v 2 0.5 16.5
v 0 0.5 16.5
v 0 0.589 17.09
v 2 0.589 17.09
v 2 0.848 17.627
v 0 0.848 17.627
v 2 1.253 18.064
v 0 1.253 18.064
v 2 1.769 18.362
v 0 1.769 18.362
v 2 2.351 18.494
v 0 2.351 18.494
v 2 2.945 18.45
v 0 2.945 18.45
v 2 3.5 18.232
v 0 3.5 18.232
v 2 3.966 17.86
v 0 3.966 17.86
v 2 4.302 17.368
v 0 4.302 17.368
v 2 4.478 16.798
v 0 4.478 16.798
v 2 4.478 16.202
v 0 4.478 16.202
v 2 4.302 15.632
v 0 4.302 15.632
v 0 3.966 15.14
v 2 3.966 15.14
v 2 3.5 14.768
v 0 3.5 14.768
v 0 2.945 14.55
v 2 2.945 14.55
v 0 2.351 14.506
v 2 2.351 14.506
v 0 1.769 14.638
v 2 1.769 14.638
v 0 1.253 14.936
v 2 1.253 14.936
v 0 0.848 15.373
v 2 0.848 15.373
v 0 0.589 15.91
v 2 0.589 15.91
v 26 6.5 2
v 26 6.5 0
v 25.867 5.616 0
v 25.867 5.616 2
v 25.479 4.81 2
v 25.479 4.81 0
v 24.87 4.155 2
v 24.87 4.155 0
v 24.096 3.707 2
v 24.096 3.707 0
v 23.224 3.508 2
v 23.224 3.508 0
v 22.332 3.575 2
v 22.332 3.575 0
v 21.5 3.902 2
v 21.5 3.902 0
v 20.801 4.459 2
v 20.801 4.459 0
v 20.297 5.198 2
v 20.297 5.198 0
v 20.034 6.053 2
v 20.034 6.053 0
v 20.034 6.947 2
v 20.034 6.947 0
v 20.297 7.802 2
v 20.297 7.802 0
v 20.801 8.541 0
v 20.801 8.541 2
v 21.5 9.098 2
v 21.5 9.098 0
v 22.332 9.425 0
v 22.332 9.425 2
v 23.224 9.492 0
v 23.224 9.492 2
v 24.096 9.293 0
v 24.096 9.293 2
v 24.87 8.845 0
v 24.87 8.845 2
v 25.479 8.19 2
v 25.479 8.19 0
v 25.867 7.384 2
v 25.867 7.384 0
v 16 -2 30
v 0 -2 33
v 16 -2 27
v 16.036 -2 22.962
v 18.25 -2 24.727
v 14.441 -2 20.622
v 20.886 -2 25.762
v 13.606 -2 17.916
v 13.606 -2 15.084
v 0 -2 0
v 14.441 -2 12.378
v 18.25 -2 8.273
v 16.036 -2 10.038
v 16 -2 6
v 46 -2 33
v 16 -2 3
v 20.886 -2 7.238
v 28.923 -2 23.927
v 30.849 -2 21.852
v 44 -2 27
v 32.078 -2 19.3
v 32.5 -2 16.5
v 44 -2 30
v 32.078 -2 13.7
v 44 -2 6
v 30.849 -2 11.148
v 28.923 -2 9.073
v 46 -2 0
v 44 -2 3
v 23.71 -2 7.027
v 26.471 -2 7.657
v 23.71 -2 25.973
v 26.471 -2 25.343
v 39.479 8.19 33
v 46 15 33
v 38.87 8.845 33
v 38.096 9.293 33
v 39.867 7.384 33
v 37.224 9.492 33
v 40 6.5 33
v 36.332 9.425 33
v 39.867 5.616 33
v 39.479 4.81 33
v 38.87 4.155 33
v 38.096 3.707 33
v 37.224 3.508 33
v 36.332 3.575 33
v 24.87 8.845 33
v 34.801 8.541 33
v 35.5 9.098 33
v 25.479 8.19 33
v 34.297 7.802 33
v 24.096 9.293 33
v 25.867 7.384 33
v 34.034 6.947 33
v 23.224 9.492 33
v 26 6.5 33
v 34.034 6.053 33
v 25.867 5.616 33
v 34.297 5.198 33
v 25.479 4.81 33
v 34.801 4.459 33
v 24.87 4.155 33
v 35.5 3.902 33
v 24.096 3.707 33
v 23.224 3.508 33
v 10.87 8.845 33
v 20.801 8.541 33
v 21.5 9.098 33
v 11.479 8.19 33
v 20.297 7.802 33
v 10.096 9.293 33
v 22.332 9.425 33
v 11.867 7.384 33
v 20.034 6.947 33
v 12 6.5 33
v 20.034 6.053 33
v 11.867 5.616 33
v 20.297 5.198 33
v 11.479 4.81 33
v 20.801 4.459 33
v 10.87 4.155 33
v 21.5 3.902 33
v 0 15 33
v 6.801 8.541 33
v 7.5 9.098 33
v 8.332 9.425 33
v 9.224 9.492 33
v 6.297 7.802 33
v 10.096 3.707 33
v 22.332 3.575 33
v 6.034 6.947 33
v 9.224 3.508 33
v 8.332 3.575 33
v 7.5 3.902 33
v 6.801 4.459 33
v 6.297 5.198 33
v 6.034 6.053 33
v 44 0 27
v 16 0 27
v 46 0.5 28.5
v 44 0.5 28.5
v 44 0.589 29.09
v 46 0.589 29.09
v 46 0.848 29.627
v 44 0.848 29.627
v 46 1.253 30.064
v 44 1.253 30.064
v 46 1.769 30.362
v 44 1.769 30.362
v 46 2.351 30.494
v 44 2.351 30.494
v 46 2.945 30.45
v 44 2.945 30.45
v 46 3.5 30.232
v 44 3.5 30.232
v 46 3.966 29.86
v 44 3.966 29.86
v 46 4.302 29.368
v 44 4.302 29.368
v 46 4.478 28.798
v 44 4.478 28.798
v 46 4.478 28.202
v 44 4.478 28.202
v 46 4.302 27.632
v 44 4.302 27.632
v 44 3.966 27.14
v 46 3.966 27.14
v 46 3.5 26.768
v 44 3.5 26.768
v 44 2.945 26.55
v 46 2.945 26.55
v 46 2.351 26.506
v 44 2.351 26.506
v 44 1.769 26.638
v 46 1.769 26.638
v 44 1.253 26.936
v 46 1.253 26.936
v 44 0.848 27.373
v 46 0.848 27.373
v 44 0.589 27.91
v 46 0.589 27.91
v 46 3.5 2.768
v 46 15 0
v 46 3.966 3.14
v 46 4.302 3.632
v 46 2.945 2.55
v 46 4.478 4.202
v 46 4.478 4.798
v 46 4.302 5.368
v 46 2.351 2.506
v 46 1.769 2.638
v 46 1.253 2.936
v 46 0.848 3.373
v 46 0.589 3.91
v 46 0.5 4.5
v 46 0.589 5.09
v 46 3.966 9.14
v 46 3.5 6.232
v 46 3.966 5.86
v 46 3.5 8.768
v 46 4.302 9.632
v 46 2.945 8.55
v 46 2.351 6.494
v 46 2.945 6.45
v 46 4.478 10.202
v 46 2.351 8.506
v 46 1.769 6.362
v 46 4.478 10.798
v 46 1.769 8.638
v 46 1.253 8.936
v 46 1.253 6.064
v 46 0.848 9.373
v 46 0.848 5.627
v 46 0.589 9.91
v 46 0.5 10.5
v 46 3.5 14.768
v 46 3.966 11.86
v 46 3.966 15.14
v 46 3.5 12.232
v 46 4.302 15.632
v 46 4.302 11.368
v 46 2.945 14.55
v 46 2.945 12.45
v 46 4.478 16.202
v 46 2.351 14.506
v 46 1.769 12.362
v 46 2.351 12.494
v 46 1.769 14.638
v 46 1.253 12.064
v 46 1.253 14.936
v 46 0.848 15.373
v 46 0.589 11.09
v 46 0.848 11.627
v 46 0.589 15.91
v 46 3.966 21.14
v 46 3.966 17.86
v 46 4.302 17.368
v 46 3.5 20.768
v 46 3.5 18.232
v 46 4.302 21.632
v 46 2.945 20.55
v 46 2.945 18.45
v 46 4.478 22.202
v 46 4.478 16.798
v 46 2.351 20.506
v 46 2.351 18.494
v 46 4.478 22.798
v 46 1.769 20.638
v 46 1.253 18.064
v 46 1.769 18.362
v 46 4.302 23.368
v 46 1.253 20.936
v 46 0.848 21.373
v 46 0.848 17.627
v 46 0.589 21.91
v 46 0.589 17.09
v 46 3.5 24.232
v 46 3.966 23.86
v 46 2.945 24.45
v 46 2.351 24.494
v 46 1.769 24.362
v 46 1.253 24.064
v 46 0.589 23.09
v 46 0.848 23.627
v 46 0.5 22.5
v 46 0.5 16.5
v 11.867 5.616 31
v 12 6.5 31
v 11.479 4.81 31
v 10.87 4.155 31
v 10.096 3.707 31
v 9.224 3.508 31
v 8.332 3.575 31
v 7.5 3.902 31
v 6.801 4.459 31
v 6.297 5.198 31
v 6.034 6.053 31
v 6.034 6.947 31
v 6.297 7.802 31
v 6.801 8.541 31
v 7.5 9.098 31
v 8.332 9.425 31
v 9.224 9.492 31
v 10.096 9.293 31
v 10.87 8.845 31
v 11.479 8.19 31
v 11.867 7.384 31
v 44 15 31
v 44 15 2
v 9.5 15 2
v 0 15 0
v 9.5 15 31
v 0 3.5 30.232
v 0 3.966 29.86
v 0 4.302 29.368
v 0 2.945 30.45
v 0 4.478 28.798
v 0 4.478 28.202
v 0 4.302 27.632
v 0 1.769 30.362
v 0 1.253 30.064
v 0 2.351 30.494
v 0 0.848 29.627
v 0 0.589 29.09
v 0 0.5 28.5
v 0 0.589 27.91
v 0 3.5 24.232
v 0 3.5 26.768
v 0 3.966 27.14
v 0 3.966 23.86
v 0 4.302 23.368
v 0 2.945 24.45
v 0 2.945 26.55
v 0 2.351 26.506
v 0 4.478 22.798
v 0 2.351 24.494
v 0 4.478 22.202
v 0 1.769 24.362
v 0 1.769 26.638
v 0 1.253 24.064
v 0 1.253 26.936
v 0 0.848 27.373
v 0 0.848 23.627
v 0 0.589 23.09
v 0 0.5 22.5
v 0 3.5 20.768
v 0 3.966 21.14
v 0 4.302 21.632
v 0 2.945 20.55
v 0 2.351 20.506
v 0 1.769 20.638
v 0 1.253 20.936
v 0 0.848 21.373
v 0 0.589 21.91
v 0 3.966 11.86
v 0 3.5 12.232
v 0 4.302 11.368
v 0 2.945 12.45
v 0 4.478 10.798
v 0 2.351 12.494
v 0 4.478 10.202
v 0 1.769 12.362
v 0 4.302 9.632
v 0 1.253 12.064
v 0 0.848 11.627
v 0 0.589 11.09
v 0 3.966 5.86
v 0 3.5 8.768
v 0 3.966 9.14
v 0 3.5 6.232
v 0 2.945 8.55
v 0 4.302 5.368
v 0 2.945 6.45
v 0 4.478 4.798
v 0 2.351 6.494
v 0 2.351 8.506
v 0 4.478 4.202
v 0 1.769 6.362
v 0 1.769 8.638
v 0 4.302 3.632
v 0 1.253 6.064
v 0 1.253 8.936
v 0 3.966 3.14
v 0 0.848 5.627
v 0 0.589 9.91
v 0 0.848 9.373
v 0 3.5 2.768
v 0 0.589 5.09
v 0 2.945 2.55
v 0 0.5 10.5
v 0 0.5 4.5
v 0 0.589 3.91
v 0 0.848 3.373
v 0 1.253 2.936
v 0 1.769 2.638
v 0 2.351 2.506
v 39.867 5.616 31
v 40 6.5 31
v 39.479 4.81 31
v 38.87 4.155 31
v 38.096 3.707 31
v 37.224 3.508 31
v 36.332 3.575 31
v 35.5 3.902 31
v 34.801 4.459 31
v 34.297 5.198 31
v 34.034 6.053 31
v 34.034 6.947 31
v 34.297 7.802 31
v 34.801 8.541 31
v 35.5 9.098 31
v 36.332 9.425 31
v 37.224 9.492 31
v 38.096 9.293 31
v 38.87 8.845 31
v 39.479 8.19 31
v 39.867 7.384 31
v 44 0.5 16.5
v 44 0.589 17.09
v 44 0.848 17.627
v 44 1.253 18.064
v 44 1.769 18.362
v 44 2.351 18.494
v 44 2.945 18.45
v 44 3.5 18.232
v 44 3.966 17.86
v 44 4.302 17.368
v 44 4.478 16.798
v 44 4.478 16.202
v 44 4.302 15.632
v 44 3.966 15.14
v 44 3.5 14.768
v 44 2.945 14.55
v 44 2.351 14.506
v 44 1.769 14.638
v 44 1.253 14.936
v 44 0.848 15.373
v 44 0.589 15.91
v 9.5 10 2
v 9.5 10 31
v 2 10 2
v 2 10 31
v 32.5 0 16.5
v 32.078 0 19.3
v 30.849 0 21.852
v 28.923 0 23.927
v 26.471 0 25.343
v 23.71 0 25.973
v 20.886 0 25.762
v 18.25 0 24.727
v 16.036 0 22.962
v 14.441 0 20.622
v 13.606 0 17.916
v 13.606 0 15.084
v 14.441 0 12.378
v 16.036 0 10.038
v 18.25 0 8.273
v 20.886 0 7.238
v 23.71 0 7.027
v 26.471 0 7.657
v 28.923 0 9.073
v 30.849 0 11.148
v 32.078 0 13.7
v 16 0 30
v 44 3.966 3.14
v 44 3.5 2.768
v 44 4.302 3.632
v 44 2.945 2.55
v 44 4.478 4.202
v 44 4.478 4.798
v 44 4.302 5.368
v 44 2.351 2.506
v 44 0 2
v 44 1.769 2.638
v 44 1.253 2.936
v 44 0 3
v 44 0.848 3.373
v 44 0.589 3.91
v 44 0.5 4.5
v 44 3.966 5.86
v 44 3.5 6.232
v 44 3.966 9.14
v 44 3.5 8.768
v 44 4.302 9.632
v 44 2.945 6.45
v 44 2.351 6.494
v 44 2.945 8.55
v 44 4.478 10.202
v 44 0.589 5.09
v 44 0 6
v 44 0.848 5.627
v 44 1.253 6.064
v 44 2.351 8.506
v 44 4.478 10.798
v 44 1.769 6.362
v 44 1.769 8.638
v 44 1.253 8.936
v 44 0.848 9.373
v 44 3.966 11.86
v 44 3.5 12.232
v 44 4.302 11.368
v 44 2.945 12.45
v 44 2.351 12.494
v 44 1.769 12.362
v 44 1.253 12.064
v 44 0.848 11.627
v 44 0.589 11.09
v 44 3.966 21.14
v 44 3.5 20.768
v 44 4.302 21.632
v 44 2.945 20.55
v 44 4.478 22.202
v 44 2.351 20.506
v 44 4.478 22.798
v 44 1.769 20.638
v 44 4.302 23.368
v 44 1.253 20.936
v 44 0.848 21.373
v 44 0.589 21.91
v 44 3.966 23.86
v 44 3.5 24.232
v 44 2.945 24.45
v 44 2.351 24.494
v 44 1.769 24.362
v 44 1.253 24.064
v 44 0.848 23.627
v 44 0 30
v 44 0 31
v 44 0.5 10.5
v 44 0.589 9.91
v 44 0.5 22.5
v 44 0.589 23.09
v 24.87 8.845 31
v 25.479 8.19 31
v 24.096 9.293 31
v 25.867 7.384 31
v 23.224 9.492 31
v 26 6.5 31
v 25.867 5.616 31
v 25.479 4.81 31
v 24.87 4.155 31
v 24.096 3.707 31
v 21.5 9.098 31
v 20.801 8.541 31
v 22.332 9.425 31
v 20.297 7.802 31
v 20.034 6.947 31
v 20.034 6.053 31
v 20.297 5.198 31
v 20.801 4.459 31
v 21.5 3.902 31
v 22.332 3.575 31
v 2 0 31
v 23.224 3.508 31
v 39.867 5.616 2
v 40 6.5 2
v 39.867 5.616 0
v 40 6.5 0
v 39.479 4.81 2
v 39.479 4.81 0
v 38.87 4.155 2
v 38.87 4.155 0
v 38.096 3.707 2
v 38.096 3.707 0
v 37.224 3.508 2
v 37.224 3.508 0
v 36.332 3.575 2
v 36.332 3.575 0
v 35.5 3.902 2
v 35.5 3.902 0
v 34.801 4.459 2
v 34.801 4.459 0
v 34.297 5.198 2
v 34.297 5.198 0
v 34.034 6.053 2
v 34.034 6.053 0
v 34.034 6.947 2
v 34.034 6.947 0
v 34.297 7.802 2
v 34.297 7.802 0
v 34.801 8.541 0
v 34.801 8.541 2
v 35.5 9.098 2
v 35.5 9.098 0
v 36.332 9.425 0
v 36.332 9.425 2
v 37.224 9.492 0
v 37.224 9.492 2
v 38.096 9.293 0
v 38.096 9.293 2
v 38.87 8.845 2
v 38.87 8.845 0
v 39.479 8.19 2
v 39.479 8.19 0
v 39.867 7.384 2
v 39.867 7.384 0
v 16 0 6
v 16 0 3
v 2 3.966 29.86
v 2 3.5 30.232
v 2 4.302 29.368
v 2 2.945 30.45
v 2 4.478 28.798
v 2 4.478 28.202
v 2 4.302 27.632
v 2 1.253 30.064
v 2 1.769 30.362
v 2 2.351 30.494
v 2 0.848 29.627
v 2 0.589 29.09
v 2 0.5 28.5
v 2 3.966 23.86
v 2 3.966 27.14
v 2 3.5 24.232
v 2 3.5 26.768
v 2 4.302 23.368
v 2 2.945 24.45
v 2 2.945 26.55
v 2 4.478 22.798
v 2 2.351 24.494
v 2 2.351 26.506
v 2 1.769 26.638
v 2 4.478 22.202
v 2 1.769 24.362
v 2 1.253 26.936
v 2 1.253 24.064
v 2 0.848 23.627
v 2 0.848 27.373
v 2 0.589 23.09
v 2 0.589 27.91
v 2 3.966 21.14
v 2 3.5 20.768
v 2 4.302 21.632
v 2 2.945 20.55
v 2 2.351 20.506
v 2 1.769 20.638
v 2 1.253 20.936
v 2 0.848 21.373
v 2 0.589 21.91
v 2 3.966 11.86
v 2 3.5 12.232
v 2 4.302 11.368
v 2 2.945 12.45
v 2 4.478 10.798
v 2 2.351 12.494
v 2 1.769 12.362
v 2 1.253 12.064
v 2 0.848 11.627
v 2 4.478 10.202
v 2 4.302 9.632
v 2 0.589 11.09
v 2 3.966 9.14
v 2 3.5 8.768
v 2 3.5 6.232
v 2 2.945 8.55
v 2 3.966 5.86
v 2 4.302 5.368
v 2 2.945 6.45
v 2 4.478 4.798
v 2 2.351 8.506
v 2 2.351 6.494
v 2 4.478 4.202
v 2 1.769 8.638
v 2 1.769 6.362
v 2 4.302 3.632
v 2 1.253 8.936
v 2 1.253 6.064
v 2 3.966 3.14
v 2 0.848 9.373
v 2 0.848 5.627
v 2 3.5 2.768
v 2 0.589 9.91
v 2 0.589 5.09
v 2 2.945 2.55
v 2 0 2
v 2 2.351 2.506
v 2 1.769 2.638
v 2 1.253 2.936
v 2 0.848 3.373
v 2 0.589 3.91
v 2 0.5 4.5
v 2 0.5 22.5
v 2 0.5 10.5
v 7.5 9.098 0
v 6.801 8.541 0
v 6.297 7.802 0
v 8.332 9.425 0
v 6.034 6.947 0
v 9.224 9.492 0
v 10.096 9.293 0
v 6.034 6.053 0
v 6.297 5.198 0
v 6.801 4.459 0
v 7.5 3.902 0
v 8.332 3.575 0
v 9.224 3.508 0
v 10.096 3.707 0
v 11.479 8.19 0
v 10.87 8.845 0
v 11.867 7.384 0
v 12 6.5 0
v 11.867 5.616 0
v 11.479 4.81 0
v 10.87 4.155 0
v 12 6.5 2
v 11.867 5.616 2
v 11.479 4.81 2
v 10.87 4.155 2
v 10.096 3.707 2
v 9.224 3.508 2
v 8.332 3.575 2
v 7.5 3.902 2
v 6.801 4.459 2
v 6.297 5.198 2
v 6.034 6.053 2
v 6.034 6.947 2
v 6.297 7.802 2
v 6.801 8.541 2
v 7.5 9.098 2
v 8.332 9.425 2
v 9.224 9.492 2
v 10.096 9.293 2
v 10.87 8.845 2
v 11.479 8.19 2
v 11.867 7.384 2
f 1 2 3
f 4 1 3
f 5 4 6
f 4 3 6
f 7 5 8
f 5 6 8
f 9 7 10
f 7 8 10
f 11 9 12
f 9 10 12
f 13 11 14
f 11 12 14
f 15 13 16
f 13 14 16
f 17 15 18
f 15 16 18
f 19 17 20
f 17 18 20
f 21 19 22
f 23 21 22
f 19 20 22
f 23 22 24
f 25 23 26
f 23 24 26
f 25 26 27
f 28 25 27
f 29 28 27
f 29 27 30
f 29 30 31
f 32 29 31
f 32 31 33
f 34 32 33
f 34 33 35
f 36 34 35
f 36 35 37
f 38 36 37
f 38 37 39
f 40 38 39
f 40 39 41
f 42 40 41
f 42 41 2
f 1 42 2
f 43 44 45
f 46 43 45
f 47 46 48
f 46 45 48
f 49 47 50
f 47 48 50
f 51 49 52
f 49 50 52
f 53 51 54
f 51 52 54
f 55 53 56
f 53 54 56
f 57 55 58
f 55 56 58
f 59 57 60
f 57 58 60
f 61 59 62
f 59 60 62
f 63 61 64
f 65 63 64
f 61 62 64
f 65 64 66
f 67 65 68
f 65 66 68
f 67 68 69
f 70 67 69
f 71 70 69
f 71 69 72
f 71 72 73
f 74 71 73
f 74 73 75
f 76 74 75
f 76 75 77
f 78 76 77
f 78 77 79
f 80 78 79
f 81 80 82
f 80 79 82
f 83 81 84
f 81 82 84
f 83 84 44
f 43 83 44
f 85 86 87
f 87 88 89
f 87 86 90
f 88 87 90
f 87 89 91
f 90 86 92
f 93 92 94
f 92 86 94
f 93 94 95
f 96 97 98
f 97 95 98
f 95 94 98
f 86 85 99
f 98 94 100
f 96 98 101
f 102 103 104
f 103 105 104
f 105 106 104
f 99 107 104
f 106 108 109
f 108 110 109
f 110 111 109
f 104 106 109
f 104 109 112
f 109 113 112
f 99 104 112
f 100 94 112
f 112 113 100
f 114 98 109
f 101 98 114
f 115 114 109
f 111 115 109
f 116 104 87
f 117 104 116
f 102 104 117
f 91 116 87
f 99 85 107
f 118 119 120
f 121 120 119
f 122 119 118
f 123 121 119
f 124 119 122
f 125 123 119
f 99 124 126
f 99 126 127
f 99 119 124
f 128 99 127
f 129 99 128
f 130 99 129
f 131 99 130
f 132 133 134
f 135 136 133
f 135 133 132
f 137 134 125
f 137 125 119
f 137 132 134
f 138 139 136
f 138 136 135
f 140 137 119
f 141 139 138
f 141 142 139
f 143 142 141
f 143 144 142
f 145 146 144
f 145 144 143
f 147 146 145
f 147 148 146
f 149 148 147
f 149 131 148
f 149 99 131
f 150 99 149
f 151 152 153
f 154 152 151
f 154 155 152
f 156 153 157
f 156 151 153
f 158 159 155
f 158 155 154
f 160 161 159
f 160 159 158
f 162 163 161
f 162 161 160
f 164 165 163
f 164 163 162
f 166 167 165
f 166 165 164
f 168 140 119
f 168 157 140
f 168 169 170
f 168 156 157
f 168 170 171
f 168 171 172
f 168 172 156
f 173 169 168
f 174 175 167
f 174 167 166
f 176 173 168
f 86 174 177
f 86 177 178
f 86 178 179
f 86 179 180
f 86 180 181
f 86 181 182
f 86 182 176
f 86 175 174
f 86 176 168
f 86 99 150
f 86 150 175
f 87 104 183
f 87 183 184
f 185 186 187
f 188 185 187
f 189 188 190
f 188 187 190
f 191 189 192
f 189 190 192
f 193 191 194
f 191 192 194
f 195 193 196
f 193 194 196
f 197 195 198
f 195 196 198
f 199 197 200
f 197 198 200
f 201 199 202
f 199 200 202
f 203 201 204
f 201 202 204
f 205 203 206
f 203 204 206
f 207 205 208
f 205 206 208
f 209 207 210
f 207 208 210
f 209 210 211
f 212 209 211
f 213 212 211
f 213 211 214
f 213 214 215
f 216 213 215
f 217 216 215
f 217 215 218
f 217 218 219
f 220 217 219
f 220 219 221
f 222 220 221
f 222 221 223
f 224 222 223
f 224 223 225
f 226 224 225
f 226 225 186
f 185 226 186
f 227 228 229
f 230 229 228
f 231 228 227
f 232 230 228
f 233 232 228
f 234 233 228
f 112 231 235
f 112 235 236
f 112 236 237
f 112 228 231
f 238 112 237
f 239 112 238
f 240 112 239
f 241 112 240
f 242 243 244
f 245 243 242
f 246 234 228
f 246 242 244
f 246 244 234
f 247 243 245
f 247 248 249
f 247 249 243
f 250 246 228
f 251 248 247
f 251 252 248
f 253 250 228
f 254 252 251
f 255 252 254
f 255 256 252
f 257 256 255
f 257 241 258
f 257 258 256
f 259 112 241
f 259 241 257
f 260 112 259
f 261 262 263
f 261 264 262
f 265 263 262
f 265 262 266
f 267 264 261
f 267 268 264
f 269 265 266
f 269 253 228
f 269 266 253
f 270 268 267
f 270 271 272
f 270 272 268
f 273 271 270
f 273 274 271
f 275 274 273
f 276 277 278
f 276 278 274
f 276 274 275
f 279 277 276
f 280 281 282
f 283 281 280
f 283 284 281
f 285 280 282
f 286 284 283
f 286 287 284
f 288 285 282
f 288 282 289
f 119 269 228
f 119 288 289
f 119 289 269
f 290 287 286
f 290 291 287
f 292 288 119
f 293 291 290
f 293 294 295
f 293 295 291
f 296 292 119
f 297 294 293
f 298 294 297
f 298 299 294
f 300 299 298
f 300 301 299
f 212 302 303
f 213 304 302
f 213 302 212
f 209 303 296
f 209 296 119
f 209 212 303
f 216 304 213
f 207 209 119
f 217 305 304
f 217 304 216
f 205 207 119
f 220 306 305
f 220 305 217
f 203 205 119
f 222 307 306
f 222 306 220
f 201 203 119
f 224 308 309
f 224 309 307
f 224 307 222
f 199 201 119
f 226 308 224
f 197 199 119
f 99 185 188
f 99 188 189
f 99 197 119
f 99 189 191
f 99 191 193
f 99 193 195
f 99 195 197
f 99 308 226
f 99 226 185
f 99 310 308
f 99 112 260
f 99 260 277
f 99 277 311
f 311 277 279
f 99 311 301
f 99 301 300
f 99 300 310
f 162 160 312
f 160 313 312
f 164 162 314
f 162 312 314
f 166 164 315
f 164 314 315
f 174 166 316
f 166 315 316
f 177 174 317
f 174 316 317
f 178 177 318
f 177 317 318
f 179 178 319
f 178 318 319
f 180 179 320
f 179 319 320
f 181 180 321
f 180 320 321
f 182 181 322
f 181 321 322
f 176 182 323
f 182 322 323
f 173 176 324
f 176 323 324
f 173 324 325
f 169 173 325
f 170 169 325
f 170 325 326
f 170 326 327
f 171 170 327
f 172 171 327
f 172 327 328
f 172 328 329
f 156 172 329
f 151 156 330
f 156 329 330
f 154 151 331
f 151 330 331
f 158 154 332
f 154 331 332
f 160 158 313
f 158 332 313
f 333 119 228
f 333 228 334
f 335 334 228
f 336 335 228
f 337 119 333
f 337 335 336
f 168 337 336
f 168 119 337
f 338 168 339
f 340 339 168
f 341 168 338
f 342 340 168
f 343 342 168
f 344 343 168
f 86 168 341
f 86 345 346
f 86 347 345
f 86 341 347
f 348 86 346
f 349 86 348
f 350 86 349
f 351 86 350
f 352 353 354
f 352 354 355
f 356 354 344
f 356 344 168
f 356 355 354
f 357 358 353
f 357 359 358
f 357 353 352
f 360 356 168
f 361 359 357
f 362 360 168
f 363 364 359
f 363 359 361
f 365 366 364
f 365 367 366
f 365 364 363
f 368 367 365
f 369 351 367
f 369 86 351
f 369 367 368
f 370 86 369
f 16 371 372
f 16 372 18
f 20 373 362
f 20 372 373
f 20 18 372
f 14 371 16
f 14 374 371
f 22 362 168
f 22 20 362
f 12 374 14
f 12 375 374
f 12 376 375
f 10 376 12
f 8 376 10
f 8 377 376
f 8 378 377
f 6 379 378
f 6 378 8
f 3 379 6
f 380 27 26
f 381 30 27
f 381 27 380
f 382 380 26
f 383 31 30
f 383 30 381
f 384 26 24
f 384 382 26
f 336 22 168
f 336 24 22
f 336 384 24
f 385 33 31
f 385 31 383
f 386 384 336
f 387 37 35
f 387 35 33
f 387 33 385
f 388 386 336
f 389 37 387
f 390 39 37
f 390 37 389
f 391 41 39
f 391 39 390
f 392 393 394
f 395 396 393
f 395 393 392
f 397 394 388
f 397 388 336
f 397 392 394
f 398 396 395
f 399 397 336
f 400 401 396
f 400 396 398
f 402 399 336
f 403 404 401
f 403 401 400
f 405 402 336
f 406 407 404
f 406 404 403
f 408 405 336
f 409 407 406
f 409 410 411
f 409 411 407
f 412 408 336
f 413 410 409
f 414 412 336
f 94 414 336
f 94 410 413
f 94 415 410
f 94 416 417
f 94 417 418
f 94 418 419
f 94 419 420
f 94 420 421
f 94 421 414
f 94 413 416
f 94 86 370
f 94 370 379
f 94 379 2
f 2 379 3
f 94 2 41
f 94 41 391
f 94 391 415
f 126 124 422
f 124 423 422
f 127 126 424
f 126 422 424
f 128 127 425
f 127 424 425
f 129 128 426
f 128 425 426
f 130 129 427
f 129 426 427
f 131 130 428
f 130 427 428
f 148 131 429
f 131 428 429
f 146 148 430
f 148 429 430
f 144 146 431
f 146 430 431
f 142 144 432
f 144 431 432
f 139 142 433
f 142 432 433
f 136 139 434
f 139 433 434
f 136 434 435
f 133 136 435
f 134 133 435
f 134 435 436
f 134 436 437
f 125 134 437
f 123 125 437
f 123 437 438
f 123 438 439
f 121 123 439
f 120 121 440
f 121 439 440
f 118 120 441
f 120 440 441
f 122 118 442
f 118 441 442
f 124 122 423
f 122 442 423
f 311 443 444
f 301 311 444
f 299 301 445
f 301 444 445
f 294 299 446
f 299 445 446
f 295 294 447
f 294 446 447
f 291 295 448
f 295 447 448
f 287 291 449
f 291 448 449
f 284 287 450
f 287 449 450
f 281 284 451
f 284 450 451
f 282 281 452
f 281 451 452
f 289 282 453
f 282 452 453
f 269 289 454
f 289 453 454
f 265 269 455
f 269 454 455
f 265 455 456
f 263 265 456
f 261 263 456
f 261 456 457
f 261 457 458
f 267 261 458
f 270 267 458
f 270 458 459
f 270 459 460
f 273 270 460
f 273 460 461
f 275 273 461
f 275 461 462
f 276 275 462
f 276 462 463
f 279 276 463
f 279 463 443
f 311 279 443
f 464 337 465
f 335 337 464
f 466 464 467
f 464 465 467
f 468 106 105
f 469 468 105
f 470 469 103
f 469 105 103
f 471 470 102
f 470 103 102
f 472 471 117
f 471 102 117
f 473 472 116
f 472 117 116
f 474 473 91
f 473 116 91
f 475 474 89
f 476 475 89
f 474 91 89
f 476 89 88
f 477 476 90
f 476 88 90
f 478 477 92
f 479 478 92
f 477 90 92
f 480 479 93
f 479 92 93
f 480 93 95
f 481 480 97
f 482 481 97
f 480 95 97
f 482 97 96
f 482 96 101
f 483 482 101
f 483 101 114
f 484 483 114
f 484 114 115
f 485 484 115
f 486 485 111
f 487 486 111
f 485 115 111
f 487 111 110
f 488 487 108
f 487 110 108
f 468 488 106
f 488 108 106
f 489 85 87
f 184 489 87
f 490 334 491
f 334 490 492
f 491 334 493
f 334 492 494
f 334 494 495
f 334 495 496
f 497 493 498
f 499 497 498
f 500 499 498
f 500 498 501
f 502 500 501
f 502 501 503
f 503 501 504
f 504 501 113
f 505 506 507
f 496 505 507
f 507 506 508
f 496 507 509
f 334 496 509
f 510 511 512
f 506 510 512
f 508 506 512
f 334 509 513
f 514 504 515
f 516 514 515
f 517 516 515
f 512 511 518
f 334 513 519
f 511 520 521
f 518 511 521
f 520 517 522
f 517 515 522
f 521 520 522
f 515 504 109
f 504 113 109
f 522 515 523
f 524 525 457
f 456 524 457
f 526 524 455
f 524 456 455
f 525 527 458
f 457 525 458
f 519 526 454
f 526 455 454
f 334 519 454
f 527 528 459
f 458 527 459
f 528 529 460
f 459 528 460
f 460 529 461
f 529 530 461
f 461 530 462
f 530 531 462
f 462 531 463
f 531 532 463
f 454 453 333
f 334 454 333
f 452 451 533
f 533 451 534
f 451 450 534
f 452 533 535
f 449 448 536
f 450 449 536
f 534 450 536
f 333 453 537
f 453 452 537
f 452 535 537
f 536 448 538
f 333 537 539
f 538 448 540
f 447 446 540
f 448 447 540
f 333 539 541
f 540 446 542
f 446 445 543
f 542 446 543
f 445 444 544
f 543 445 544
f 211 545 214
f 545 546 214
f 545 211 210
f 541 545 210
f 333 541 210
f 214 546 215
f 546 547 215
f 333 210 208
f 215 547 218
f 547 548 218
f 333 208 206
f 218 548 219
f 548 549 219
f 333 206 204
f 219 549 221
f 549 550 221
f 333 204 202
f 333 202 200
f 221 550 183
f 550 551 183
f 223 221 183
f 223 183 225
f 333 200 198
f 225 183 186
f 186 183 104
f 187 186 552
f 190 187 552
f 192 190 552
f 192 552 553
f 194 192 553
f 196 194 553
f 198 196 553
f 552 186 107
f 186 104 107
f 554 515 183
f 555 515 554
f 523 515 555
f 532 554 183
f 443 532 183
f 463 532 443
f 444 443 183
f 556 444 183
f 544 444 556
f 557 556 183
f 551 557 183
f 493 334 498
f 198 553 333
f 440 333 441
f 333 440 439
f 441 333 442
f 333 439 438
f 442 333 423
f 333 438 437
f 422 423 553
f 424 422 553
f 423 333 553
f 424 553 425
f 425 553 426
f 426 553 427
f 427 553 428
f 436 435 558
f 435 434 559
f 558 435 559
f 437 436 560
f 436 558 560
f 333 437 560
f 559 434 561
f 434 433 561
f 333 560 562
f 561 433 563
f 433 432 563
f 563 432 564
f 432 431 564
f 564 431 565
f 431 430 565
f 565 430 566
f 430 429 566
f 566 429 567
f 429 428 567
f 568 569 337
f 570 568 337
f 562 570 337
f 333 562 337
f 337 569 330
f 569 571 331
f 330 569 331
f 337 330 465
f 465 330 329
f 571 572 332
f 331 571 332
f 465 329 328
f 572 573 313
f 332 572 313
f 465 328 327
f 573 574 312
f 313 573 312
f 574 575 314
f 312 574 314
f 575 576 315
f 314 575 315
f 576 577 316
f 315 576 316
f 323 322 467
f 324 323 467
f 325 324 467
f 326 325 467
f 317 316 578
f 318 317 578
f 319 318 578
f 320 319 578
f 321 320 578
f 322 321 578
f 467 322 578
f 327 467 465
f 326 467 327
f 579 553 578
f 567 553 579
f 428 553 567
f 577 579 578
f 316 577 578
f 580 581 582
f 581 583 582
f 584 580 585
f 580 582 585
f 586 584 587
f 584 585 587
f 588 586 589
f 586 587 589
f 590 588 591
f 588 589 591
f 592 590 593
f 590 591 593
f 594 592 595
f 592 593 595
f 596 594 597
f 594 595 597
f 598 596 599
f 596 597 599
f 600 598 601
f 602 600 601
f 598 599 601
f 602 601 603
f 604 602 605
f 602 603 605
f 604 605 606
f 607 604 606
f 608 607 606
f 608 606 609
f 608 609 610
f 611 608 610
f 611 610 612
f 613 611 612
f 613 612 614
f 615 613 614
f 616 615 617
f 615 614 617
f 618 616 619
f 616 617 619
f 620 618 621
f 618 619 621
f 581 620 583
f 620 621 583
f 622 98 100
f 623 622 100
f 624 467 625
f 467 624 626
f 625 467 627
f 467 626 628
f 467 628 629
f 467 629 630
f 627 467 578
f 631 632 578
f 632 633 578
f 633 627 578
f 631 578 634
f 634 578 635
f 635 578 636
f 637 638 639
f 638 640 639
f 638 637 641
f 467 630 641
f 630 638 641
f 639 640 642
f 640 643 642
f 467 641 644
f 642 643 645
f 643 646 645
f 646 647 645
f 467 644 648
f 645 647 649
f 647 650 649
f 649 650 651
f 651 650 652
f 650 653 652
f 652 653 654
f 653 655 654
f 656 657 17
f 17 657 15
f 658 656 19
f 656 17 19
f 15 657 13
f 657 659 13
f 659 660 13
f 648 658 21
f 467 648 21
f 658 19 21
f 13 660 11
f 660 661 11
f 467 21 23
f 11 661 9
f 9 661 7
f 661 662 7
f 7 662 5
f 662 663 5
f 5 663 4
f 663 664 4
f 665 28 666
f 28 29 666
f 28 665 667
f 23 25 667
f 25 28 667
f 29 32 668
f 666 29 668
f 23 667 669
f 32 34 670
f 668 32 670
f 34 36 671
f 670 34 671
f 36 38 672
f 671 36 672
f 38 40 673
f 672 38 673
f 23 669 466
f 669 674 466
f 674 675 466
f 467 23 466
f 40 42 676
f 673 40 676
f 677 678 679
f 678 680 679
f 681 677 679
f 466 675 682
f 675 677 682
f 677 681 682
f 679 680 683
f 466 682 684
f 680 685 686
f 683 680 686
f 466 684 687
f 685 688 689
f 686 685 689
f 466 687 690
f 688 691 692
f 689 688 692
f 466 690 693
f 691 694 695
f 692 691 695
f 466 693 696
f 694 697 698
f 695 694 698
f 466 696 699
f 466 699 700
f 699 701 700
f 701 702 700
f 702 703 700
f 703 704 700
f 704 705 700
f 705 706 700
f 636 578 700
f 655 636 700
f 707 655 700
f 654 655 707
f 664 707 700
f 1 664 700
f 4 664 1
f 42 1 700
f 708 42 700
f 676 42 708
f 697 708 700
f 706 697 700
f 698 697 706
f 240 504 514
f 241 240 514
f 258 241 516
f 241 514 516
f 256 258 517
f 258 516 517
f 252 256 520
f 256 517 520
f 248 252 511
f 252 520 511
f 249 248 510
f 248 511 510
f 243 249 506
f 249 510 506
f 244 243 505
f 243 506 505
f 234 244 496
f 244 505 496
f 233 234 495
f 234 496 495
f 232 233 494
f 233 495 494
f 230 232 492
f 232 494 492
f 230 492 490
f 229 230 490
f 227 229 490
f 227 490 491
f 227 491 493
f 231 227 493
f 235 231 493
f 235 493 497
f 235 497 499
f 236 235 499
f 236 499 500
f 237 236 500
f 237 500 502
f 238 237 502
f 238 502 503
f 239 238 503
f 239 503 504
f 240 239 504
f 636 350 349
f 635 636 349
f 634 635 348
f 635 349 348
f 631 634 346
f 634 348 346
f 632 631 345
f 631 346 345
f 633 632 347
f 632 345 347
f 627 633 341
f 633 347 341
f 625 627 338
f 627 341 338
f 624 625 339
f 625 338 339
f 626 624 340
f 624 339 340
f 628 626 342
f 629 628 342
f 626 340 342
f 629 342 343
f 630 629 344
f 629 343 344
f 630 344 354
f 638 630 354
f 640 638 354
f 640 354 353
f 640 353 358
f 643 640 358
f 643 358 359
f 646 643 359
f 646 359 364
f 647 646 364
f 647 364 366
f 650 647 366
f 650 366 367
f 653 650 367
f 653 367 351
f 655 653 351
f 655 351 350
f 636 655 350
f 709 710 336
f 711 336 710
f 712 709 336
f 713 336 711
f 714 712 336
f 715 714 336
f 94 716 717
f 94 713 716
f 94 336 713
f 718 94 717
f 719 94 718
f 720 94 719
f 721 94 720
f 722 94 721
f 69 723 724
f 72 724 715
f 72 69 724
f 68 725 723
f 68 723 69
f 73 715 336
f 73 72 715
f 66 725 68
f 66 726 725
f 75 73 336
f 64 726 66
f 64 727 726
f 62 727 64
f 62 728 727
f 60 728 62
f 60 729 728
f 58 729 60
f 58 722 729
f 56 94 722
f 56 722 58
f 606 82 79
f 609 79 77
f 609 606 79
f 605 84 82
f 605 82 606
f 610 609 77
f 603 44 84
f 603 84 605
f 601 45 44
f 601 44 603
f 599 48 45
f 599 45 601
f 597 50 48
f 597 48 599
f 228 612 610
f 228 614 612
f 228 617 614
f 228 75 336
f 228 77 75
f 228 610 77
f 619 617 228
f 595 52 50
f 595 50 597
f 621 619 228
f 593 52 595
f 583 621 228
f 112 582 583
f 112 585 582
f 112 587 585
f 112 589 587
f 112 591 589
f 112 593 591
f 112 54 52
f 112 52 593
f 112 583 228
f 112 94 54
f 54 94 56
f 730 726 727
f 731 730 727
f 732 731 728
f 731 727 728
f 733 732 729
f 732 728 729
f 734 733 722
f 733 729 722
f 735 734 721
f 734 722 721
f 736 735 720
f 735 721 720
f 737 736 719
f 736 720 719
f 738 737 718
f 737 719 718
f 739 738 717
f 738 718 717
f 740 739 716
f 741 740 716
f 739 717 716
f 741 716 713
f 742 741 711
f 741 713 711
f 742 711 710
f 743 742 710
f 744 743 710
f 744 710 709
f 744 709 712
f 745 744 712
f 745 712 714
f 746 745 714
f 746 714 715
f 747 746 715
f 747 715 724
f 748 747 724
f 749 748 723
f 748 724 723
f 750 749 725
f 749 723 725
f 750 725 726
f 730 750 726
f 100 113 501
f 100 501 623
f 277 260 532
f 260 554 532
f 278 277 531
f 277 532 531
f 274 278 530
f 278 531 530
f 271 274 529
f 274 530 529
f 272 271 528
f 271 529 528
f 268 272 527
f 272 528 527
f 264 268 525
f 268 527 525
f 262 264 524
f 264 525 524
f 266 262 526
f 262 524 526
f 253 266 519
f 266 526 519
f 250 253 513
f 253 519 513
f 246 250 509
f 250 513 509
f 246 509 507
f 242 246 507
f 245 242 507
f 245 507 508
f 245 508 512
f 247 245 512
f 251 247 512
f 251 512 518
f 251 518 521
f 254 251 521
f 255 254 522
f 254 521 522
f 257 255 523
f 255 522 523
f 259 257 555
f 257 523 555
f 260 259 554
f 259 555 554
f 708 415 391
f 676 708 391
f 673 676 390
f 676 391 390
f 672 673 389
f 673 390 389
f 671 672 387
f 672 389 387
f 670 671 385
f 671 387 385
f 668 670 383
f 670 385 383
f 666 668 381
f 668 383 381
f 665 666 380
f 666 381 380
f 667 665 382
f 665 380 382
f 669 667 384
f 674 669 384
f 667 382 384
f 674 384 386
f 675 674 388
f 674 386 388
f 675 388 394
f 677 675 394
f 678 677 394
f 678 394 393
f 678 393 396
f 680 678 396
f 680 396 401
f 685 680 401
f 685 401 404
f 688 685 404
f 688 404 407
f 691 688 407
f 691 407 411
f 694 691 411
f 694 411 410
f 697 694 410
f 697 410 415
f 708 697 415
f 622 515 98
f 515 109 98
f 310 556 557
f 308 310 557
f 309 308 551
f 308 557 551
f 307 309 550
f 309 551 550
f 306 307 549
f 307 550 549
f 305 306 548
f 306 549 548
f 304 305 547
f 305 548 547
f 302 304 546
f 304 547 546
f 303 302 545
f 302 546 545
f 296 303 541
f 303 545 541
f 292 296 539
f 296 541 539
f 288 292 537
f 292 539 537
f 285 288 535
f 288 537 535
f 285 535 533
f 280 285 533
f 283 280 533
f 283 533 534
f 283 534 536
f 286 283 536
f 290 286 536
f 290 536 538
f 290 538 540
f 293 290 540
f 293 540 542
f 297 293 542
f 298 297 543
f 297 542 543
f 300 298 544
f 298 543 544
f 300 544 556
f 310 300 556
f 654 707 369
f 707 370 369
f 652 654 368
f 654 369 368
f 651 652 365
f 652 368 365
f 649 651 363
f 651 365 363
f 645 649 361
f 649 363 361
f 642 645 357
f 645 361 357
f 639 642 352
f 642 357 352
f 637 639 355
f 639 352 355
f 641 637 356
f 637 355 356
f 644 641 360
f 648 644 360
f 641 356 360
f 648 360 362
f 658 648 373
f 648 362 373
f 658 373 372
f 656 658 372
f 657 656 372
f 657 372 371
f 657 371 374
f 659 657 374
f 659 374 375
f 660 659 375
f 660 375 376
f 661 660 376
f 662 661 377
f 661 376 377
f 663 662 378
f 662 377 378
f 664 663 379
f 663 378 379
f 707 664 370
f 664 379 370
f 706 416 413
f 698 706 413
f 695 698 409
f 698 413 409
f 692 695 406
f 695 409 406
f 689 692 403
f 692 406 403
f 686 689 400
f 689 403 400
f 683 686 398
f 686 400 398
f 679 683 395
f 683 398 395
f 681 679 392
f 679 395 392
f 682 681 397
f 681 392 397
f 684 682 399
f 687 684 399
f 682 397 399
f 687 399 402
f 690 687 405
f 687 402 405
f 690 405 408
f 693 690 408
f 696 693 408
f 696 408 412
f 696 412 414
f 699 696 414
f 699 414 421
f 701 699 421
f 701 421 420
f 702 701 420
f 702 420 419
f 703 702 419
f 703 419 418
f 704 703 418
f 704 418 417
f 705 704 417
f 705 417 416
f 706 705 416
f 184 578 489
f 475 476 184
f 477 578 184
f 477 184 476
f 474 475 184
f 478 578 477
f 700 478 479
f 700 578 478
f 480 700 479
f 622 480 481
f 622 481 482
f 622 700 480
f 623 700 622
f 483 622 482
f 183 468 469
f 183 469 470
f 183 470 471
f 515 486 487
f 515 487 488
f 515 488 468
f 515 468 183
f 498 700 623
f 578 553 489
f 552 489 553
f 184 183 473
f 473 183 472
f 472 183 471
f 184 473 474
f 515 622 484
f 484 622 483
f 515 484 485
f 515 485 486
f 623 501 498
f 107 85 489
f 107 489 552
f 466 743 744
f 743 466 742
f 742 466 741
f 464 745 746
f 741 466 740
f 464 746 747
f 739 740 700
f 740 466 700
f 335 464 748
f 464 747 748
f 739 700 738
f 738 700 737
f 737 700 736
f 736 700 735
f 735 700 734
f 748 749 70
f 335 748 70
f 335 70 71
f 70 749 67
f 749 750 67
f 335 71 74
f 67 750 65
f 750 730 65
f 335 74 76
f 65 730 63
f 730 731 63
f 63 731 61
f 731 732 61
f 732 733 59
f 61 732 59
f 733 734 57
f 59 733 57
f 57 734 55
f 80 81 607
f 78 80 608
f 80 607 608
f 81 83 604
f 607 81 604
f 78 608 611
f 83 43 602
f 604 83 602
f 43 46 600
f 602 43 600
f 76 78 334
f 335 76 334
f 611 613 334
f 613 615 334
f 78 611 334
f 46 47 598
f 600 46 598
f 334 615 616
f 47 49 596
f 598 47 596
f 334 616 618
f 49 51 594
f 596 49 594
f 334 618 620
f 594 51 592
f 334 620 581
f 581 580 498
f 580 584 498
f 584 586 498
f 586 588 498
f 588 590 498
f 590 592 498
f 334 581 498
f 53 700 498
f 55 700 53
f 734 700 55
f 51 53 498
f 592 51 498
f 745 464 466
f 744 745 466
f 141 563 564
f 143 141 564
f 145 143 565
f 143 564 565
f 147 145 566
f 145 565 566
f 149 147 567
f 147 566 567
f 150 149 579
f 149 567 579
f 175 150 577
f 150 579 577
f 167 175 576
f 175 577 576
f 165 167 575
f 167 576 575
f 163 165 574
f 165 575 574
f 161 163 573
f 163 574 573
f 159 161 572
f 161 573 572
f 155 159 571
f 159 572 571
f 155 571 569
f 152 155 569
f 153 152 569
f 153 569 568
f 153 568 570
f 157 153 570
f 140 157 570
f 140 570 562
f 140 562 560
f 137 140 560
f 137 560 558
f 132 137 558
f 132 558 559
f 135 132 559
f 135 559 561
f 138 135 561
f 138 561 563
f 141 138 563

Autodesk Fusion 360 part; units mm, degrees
sketch "Skizze1" plane through (0, 0, 0) normal (0, 1, 0) x (1, 0, 0)
  line L0 (0, 0) -> (46, 0)
  line L1 (46, 0) -> (46, -33)
  line L2 (46, -33) -> (0, -33)
  line L3 (0, -33) -> (0, 0)
  line L4 (2, -2) -> (44, -2)
  line L5 (44, -2) -> (44, -31)
  line L6 (44, -31) -> (2, -31)
  line L7 (2, -31) -> (2, -2)
  dimension "d1" = 46
  dimension "d2" = 33
  dimension "d3" = 2
extrude "Extrusion1" add sketch "Skizze1" against normal blind 2 contours L0 L1 L2 L3 | L4 L5 L6 L7
extrude "Extrusion2" add sketch "Skizze1" along normal blind 15
sketch "Skizze2" plane through (0, 0, 0) normal (0, 1, 0) x (1, 0, 0)
sketch "Skizze3" plane through (0, 15, 0) normal (0, 1, 0) x (-1, 0, 0)
  line L0 (-44, 31) -> (-2, 31)
  line L1 (-2, 31) -> (-2, 2)
  line L2 (-2, 2) -> (-44, 2)
  line L3 (-44, 2) -> (-44, 31)
  line L4 (0, 33) -> (-46, 33)
  line L5 (-46, 33) -> (-46, 0)
  line L6 (-46, 0) -> (0, 0)
  line L7 (0, 0) -> (0, 33)
  line L8 (-2, 31) -> (-9.5, 31)
  line L9 (-9.5, 31) -> (-9.5, 2)
  line L10 (-9.5, 2) -> (-2, 2)
  line L11 (-2, 2) -> (-2, 31)
  dimension "d8" = 7.5
extrude "Extrusion3" add sketch "Skizze3" against normal blind 5 contours L0 L1 L2 L8 L9 L10 L11
sketch "Skizze4" plane through (0, -2, 0) normal (0, -1, 0) x (1, 0, 0)
  line L0 (46, 33) -> (0, 33)
  line L1 (0, 33) -> (0, 0)
  line L2 (0, 0) -> (46, 0)
  line L3 (46, 0) -> (46, 33)
  line L4 (46, 33) -> (16, 33)
  line L5 (16, 33) -> (16, 0)
  line L6 (16, 0) -> (46, 0)
  line L7 (46, 0) -> (46, 33)
  line L8 (16, 33) -> (46, 33)
  line L9 (16, 30) -> (16, 33)
  line L10 (16, 0) -> (46, 0)
  line L11 (46, 0) -> (46, 3)
  line L12 (46, 3) -> (16, 3)
  line L13 (16, 3) -> (16, 0)
  line L14 (16, 3) -> (46, 3)
  line L15 (46, 3) -> (46, 6)
  line L16 (46, 6) -> (16, 6)
  line L17 (16, 6) -> (16, 3)
  line L18 (0, 33) -> (46, 0)
  line L19 (46, 33) -> (0, 0)
  circle A0 centre (23, 16.5) radius 9.5
  line L20 (44, 35) -> (44, -3)
  line L21 (16, 30) -> (44, 30)
  line L22 (44, 30) -> (44, 27)
  line L23 (44, 27) -> (16, 27)
  line L24 (16, 27) -> (16, 30)
  dimension "d12" = 3
extrude "Extrusion4" cut sketch "Skizze4" against normal blind 6 contours L5 L19 L21 L23 L24 | L5 L18 A0 | L5 L18 L19 A0 | L19 L20 L21 L22 L23 | L5 L19 A0 | L5 L18 L19 | L5 L18 L19 A0 | L5 L12 L14 L16 L17 L18 | L5 L18 L19 A0 | L18 L19 A0 | L12 L14 L16 L18 L20
sketch "Skizze5" plane through (0, 0, 0) normal (0, 0, -1) x (1, 0, 0)
  line L0 (46, -15) -> (46, 2)
  line L1 (46, 2) -> (0, 2)
  line L2 (0, 2) -> (0, -15)
  line L3 (0, -15) -> (46, -15)
  line L4 (46, -15) -> (0, 2)
  line L5 (46, 2) -> (0, -15)
  circle A0 centre (23, -6.5) radius 3
  circle A1 centre (9, -6.5) radius 3
  circle A2 centre (37, -6.5) radius 3
  dimension "d17" = 14
  dimension "d18" = 0
  dimension "d21" = 6
extrude "Extrusion5" cut sketch "Skizze5" against normal blind 40 contours L4 L5 A0 | L4 L5 A0 | L4 L5 A0 | L4 L5 A0 | A1 | A2
sketch "Skizze6" plane through (0, 0, 0) normal (-1, 0, 0) x (0, -1, 0)
  line L0 (-15, 0) -> (2, 0)
  line L1 (2, 0) -> (2, 33)
  line L2 (2, 33) -> (-15, 33)
  line L3 (-15, 33) -> (-15, 0)
  line L4 (-15, 33) -> (2, 0)
  circle A0 centre (-6.5, 16.5) radius 2
  circle A1 centre (-2.5, 16.5) radius 2
  circle A2 centre (-2.5, 4.5) radius 2
  circle A3 centre (-2.5, 10.5) radius 2
  circle A4 centre (-2.5, 22.5) radius 2
  circle A5 centre (-2.5, 28.5) radius 2
  dimension "d22" = 4
  dimension "d25" = 4
  dimension "d26" = 0
  dimension "d29" = 0
  dimension "d30" = 12
extrude "Extrusion6" cut sketch "Skizze6" against normal blind 130 contours A1 | L4 A2 | L4 A2 | L4 A3 | L4 A3 | A4 | A5
